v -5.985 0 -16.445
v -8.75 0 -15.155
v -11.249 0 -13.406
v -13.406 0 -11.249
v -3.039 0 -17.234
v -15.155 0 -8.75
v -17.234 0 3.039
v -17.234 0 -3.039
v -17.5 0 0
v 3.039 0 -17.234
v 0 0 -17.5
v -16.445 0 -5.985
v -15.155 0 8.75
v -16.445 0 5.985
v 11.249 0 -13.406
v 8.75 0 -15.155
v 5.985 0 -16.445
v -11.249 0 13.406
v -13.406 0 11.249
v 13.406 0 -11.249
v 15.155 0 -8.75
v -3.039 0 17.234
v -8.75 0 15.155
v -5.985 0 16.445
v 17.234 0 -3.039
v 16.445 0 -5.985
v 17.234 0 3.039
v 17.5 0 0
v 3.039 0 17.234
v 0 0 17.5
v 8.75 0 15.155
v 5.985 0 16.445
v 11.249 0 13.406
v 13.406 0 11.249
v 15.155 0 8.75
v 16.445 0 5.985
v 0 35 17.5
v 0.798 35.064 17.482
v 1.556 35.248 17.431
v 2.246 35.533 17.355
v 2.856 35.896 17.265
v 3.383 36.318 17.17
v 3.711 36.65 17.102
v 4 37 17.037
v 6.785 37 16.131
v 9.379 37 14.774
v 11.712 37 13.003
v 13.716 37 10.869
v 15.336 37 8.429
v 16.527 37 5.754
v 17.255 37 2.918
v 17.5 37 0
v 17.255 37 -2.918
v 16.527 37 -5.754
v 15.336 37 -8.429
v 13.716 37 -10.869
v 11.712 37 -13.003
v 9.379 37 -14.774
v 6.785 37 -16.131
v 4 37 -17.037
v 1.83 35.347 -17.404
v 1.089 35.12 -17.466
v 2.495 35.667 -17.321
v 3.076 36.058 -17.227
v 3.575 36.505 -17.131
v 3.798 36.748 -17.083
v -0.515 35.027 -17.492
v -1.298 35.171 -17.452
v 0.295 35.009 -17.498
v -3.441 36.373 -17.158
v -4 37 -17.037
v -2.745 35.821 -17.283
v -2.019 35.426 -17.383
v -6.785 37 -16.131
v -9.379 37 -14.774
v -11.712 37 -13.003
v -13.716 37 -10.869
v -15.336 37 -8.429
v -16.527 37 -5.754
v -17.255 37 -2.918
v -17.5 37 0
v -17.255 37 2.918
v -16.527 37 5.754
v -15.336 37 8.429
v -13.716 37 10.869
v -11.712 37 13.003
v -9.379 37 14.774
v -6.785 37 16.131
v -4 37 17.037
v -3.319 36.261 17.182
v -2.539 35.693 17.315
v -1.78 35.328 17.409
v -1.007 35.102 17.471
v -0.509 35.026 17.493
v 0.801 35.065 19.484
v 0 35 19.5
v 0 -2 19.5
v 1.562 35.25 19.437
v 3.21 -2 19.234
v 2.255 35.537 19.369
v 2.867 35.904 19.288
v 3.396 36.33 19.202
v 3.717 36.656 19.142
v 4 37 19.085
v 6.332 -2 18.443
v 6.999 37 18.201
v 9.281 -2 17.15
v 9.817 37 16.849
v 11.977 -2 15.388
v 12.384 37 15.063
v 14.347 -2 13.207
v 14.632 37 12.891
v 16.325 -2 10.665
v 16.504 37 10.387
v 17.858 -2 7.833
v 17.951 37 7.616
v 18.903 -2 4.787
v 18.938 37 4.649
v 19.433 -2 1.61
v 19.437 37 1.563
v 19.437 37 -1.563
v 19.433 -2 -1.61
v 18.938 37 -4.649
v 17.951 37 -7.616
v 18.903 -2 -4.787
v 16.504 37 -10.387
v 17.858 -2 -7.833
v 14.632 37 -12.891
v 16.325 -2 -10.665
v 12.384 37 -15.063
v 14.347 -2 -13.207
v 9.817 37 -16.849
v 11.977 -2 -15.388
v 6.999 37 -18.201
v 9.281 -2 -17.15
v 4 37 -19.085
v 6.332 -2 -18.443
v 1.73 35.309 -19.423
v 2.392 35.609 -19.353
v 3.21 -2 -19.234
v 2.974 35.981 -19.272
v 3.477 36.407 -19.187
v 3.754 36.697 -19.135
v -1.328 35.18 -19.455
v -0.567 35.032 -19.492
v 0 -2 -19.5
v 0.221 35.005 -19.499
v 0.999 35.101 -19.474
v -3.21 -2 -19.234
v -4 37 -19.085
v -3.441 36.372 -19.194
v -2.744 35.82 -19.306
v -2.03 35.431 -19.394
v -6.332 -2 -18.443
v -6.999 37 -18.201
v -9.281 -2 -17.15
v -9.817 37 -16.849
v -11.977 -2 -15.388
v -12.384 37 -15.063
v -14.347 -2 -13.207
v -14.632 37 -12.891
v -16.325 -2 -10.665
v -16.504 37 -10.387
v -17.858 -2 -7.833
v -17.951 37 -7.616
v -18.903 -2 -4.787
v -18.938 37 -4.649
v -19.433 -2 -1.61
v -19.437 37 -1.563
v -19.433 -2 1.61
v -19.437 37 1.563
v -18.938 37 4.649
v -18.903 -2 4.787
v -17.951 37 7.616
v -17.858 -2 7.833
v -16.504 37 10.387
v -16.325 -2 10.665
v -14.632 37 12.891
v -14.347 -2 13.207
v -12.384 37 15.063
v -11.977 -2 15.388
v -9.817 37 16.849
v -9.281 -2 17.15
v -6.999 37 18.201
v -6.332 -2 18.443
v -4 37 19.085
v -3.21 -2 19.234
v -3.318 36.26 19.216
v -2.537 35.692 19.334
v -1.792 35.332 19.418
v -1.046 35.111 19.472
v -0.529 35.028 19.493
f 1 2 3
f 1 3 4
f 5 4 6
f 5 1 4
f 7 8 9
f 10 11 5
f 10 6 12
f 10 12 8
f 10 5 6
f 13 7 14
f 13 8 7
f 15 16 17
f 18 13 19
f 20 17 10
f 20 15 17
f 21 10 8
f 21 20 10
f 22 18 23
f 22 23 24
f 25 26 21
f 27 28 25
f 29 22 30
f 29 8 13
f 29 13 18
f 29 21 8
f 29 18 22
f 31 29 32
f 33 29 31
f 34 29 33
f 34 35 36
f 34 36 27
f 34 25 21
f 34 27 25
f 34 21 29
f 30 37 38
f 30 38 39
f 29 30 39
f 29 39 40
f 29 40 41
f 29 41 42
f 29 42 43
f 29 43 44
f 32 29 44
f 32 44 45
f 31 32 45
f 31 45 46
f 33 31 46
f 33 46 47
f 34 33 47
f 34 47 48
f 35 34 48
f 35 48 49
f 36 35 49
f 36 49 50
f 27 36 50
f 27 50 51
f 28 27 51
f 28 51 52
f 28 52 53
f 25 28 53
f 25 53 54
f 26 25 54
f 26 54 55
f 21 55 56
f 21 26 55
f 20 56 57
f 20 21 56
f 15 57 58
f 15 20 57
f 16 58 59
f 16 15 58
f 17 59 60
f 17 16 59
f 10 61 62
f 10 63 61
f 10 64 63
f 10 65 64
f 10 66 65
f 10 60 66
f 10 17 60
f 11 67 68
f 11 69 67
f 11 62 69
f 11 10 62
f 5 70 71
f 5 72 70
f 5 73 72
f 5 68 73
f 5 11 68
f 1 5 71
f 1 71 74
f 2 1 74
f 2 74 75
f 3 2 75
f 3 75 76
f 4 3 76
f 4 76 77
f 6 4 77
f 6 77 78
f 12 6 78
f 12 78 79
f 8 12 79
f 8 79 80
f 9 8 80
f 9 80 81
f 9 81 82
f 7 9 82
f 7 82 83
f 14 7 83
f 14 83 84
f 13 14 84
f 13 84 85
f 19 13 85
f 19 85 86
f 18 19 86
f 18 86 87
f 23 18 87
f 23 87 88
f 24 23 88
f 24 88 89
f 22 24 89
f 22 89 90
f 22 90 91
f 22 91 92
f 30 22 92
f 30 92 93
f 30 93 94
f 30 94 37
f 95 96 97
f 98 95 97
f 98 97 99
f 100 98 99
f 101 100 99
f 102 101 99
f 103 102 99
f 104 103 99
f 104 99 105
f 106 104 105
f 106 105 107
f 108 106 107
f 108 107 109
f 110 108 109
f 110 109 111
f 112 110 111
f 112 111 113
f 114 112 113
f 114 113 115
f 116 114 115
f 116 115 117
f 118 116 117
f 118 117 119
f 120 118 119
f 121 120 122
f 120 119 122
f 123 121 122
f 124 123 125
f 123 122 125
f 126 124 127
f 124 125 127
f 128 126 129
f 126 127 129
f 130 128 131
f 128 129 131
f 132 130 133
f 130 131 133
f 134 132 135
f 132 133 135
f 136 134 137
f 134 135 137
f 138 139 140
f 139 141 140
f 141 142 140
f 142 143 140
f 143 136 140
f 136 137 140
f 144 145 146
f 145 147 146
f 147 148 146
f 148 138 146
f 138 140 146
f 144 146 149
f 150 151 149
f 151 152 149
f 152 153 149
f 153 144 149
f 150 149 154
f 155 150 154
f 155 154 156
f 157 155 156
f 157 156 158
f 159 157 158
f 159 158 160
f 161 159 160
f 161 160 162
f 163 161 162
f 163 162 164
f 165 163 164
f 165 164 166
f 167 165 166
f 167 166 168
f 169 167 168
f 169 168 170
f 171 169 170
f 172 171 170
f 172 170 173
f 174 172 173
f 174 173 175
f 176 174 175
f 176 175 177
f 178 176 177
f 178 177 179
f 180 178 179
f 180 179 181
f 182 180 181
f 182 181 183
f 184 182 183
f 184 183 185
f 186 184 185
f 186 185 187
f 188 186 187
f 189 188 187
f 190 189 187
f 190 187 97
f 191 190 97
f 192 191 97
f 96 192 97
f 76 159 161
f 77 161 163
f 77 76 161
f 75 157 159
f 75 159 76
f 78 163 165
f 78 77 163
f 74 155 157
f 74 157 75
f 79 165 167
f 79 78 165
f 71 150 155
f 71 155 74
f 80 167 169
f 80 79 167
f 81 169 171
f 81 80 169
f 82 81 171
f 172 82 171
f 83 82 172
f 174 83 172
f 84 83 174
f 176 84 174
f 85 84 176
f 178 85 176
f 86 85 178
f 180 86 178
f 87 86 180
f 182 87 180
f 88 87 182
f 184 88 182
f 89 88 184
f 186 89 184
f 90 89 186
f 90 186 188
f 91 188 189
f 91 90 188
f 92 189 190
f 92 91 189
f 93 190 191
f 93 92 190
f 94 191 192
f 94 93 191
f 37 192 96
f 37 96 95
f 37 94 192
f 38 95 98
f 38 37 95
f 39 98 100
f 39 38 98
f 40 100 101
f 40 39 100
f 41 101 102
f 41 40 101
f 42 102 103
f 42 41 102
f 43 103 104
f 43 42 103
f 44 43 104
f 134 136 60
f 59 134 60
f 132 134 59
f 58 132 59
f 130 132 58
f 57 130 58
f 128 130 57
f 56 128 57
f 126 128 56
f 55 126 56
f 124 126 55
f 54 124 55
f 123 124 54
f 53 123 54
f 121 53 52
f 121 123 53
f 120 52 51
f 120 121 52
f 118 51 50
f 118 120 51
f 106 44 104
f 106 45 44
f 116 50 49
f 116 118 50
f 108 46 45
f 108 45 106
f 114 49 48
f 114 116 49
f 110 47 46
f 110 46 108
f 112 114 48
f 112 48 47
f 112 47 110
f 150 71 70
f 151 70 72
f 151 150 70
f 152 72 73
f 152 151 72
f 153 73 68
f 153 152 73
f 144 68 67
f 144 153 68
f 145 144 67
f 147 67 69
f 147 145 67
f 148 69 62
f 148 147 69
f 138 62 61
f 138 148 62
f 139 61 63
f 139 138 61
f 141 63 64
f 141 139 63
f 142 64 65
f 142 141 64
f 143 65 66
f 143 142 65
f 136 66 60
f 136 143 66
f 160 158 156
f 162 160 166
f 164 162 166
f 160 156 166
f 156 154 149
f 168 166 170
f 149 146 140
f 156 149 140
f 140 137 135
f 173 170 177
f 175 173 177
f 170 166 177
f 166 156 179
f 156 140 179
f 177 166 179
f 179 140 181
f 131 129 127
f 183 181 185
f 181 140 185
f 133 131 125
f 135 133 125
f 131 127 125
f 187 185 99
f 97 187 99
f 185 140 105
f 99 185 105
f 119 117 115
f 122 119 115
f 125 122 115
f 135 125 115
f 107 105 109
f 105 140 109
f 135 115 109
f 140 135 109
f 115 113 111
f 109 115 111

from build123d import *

# Parameters (mm, degrees)
SKETCH1_R               = 19.5
SKETCH1_R_2             = 17.5
BOSS_EXTRUDE1_DEPTH     = 37
BOSS_EXTRUDE2_START     = -2
SKETCH1_2_R             = 19.5
BOSS_EXTRUDE2_DEPTH     = 2
CUT_EXTRUDE1_DEPTH      = 47.146505827
CUT_EXTRUDE1_DEPTH_BACK = 47.146505827
SKETCH2_R               = 5


with BuildPart() as part:
    # Sketch1 → Boss-Extrude1 (new body)
    with BuildSketch(Plane(origin=(0, 0, 0), x_dir=(1, 0, 0), z_dir=(0, 1, 0))):
        Circle(SKETCH1_R)
        Circle(SKETCH1_R_2, mode=Mode.SUBTRACT)
    extrude(amount=BOSS_EXTRUDE1_DEPTH)

    # Sketch1<2> → Boss-Extrude2 (add)
    with BuildSketch(Plane(origin=(0, 0, 0), x_dir=(1, 0, 0), z_dir=(0, 1, 0)).offset(BOSS_EXTRUDE2_START)):
        Circle(SKETCH1_2_R)
    extrude(amount=BOSS_EXTRUDE2_DEPTH)

    # Sketch2 → Cut-Extrude1 (cut, two sides: drawn at the far end of the back side and taken through both)
    with BuildSketch(Plane.XY.offset(-CUT_EXTRUDE1_DEPTH_BACK)):
        with Locations((0, 40)):
            Circle(SKETCH2_R)
    extrude(amount=CUT_EXTRUDE1_DEPTH + CUT_EXTRUDE1_DEPTH_BACK, mode=Mode.SUBTRACT)


solid = part.part
